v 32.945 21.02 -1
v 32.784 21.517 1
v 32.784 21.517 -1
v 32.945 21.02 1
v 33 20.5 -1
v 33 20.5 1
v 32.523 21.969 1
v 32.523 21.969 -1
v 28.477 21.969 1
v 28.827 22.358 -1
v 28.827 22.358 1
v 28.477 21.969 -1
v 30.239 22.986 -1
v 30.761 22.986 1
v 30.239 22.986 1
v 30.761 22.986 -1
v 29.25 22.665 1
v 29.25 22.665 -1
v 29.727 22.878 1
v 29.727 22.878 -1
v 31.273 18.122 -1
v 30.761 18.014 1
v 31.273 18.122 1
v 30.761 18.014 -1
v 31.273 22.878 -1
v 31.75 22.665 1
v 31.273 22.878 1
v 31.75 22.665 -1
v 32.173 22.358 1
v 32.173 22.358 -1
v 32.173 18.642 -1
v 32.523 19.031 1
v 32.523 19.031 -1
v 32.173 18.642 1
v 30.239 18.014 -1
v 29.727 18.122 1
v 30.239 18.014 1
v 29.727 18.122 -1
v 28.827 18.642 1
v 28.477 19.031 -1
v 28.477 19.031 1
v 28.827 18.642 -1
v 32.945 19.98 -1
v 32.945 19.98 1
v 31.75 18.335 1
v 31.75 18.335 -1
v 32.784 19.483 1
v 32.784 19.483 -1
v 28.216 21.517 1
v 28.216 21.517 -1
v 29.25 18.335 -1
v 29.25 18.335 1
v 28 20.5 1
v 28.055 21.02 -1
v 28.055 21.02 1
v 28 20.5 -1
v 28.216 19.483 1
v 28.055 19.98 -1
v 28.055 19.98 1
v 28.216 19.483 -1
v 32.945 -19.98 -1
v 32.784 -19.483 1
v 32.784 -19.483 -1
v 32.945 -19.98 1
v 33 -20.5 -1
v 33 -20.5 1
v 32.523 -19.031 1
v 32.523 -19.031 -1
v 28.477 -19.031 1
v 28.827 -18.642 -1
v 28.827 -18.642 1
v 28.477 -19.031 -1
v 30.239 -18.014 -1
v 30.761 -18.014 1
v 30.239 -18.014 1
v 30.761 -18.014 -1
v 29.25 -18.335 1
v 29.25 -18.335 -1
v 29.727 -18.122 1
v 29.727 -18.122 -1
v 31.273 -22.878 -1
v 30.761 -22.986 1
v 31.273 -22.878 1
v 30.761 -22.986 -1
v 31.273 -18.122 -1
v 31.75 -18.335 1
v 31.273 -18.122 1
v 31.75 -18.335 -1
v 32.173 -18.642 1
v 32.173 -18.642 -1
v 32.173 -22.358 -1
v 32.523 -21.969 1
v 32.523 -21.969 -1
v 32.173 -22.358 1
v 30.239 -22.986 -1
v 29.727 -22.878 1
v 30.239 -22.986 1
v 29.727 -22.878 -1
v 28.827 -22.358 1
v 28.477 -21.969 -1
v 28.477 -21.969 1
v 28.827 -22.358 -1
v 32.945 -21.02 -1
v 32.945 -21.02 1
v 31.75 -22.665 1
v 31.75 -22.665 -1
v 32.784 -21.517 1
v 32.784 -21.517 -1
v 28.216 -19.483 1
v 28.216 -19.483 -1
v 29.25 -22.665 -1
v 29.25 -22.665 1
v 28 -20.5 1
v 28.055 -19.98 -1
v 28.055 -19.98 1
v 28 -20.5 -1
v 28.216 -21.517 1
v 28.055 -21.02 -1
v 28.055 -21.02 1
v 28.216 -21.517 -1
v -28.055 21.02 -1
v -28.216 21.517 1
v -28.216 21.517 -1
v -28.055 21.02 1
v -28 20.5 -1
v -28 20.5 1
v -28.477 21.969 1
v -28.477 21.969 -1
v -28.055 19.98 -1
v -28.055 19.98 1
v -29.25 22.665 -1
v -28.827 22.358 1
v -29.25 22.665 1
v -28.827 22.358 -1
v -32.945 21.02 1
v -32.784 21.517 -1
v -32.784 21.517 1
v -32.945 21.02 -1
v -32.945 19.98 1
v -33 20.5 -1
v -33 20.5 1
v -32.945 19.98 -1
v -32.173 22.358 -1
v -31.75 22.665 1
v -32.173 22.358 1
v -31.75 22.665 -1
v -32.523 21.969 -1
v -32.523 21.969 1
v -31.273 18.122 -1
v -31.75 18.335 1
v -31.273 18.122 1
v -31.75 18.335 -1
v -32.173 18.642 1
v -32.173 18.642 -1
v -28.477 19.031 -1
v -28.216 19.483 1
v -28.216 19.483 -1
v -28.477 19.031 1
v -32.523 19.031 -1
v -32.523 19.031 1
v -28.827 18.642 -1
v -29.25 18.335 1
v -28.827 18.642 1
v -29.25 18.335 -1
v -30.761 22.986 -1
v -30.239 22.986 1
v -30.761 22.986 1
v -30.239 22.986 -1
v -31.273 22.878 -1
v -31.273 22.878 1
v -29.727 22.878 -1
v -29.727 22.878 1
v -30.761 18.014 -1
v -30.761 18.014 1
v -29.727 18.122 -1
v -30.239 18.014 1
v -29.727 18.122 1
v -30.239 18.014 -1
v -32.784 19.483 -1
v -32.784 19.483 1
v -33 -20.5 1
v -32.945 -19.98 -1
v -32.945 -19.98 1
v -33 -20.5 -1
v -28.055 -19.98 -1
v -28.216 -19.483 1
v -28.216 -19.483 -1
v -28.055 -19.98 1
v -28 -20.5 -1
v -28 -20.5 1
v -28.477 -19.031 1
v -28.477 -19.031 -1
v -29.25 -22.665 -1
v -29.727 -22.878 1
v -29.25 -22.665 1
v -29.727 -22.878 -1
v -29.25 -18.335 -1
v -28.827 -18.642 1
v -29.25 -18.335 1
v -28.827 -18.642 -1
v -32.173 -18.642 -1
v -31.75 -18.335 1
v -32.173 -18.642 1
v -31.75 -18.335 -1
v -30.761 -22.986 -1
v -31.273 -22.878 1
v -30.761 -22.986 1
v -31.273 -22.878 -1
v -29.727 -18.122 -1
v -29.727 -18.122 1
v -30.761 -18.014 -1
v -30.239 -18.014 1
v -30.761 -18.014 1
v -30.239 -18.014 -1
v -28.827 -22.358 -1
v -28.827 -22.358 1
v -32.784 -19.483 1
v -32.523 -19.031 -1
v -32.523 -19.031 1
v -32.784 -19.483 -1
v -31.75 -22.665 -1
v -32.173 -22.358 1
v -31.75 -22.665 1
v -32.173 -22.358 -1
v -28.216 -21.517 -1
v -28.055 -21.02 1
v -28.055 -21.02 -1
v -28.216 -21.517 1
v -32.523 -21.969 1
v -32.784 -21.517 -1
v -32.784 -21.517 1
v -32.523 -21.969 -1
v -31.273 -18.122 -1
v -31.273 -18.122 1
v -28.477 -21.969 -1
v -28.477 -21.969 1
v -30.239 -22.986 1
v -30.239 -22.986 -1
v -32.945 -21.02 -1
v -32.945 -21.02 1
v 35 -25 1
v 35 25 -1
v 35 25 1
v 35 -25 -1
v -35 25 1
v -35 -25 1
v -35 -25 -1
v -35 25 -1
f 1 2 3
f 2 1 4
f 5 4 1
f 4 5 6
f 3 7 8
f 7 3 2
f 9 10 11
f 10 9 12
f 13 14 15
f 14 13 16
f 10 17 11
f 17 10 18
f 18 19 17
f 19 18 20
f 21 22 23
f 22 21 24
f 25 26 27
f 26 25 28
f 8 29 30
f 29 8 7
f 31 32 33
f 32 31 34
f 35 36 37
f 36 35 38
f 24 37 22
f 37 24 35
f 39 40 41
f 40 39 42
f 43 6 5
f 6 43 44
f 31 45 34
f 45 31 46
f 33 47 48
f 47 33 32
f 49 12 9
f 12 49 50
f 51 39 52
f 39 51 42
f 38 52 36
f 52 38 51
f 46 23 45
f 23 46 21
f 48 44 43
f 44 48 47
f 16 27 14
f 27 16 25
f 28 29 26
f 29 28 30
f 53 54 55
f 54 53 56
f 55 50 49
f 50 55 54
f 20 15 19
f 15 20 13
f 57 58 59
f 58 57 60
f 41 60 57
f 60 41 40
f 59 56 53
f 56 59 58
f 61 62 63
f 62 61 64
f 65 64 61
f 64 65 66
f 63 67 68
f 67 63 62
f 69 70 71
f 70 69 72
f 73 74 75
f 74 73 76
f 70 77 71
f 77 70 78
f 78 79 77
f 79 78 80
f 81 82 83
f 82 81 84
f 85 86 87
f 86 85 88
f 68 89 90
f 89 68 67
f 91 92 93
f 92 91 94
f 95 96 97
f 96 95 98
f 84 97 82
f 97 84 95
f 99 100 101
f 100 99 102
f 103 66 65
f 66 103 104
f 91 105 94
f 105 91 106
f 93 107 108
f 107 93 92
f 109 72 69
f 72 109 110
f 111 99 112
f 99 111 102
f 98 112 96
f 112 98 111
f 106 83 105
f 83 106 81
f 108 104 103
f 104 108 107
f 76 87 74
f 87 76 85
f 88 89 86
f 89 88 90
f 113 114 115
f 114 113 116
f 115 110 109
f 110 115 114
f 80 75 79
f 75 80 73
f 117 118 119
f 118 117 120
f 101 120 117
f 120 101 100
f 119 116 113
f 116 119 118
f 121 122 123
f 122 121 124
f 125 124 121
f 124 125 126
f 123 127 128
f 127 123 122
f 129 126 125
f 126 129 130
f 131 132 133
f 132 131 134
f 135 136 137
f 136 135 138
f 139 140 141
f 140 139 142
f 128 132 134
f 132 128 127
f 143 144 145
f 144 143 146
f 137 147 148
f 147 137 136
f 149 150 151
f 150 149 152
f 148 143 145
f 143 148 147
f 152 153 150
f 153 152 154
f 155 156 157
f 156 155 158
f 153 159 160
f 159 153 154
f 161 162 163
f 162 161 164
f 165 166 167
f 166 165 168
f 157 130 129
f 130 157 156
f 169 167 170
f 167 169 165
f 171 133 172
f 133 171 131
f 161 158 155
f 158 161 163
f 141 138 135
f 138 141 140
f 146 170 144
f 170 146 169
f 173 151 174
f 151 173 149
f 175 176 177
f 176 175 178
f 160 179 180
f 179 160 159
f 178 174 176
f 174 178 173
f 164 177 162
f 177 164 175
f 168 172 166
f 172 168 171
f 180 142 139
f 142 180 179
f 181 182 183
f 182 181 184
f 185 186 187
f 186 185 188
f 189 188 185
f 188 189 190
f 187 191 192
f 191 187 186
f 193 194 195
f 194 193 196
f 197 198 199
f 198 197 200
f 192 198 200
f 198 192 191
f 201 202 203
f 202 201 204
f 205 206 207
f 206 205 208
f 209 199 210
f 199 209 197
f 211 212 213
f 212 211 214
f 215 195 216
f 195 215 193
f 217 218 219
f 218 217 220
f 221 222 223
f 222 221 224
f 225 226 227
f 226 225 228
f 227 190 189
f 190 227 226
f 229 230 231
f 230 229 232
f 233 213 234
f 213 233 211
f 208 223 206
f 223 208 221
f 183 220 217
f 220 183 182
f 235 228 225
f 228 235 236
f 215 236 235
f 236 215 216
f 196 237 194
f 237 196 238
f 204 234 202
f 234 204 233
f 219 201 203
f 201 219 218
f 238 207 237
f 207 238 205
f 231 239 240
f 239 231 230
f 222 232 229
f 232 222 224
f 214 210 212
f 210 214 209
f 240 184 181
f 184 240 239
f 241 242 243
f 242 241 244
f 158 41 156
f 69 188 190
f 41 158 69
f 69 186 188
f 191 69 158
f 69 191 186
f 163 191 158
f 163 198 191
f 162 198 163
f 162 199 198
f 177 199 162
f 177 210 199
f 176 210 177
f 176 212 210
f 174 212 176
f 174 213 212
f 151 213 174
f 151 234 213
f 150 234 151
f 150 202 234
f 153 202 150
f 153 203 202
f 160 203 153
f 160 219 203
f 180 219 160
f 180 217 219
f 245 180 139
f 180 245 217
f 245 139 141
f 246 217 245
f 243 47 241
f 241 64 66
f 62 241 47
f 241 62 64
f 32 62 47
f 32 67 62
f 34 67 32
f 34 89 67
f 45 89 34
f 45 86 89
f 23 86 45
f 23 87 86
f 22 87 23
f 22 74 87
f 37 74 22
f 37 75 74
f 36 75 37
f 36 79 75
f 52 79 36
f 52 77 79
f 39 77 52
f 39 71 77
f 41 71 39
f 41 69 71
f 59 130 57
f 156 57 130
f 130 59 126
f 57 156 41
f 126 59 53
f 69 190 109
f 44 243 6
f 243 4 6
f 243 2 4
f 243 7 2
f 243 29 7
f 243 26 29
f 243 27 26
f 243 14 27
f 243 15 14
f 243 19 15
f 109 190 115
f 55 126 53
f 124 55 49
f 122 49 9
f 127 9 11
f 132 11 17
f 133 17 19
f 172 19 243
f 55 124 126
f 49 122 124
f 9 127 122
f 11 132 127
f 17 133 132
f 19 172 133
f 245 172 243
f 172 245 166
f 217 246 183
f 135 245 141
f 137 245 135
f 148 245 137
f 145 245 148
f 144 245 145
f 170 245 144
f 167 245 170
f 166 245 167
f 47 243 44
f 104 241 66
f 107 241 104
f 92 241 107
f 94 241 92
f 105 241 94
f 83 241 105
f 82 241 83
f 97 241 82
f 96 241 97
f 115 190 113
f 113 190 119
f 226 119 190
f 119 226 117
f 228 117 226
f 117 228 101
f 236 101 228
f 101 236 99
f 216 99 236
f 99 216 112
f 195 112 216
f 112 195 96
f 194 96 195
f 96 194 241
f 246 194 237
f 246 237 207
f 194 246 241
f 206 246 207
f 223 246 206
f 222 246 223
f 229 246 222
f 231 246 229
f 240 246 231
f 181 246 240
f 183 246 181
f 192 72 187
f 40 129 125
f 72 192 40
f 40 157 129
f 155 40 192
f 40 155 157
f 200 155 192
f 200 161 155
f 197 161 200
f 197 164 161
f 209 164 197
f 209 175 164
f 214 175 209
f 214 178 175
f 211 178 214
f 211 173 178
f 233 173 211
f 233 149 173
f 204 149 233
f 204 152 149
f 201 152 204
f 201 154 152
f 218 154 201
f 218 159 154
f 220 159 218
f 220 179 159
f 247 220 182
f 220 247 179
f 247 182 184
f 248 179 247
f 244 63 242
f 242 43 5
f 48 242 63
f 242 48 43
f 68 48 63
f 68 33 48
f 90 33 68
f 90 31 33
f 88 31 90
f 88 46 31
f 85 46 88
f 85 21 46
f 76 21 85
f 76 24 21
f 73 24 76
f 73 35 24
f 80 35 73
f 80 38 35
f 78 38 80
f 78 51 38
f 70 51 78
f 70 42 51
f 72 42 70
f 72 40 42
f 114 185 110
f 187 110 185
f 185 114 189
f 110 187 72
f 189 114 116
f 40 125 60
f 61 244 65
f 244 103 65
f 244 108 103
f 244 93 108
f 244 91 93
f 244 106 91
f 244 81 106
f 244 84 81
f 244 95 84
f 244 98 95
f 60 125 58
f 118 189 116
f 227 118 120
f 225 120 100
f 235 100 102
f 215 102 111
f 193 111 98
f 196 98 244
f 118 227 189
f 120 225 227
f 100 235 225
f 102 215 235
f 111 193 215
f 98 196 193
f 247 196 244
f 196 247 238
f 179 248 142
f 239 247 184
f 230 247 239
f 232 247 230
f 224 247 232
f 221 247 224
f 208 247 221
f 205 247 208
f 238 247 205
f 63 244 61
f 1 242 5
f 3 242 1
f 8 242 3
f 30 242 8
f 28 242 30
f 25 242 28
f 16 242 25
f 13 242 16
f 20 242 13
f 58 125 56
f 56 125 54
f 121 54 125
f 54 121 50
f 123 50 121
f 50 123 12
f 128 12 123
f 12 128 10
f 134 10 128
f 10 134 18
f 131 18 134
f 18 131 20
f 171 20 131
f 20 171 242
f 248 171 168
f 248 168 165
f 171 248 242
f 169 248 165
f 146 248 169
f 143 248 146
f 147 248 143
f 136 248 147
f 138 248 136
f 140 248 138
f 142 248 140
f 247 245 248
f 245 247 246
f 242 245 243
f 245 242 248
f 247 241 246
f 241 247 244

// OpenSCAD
/*
Exercício 2
Crie uma placa retangular de 50mm por 70mm com 2mm de Espessura com furos 
de 5mm de diâmetro em cada um dos cantos a 2mm das bordas;
*/


C=70; //Comprimento
L=50; //Largura
E=2;  //Espessura
D=5;  //Diametro do furo
M=2;  //Margem

difference(){
    cube([C, L, E], center=true);
    for (i=[1, -1]){
        for (j=[1,-1]){
            translate([i*(C/2-D/2-M),j*(L/2-D/2-M),0])
                cylinder(d=D, h=E+1, center=true, $fs=.1);
        }
    }
}
